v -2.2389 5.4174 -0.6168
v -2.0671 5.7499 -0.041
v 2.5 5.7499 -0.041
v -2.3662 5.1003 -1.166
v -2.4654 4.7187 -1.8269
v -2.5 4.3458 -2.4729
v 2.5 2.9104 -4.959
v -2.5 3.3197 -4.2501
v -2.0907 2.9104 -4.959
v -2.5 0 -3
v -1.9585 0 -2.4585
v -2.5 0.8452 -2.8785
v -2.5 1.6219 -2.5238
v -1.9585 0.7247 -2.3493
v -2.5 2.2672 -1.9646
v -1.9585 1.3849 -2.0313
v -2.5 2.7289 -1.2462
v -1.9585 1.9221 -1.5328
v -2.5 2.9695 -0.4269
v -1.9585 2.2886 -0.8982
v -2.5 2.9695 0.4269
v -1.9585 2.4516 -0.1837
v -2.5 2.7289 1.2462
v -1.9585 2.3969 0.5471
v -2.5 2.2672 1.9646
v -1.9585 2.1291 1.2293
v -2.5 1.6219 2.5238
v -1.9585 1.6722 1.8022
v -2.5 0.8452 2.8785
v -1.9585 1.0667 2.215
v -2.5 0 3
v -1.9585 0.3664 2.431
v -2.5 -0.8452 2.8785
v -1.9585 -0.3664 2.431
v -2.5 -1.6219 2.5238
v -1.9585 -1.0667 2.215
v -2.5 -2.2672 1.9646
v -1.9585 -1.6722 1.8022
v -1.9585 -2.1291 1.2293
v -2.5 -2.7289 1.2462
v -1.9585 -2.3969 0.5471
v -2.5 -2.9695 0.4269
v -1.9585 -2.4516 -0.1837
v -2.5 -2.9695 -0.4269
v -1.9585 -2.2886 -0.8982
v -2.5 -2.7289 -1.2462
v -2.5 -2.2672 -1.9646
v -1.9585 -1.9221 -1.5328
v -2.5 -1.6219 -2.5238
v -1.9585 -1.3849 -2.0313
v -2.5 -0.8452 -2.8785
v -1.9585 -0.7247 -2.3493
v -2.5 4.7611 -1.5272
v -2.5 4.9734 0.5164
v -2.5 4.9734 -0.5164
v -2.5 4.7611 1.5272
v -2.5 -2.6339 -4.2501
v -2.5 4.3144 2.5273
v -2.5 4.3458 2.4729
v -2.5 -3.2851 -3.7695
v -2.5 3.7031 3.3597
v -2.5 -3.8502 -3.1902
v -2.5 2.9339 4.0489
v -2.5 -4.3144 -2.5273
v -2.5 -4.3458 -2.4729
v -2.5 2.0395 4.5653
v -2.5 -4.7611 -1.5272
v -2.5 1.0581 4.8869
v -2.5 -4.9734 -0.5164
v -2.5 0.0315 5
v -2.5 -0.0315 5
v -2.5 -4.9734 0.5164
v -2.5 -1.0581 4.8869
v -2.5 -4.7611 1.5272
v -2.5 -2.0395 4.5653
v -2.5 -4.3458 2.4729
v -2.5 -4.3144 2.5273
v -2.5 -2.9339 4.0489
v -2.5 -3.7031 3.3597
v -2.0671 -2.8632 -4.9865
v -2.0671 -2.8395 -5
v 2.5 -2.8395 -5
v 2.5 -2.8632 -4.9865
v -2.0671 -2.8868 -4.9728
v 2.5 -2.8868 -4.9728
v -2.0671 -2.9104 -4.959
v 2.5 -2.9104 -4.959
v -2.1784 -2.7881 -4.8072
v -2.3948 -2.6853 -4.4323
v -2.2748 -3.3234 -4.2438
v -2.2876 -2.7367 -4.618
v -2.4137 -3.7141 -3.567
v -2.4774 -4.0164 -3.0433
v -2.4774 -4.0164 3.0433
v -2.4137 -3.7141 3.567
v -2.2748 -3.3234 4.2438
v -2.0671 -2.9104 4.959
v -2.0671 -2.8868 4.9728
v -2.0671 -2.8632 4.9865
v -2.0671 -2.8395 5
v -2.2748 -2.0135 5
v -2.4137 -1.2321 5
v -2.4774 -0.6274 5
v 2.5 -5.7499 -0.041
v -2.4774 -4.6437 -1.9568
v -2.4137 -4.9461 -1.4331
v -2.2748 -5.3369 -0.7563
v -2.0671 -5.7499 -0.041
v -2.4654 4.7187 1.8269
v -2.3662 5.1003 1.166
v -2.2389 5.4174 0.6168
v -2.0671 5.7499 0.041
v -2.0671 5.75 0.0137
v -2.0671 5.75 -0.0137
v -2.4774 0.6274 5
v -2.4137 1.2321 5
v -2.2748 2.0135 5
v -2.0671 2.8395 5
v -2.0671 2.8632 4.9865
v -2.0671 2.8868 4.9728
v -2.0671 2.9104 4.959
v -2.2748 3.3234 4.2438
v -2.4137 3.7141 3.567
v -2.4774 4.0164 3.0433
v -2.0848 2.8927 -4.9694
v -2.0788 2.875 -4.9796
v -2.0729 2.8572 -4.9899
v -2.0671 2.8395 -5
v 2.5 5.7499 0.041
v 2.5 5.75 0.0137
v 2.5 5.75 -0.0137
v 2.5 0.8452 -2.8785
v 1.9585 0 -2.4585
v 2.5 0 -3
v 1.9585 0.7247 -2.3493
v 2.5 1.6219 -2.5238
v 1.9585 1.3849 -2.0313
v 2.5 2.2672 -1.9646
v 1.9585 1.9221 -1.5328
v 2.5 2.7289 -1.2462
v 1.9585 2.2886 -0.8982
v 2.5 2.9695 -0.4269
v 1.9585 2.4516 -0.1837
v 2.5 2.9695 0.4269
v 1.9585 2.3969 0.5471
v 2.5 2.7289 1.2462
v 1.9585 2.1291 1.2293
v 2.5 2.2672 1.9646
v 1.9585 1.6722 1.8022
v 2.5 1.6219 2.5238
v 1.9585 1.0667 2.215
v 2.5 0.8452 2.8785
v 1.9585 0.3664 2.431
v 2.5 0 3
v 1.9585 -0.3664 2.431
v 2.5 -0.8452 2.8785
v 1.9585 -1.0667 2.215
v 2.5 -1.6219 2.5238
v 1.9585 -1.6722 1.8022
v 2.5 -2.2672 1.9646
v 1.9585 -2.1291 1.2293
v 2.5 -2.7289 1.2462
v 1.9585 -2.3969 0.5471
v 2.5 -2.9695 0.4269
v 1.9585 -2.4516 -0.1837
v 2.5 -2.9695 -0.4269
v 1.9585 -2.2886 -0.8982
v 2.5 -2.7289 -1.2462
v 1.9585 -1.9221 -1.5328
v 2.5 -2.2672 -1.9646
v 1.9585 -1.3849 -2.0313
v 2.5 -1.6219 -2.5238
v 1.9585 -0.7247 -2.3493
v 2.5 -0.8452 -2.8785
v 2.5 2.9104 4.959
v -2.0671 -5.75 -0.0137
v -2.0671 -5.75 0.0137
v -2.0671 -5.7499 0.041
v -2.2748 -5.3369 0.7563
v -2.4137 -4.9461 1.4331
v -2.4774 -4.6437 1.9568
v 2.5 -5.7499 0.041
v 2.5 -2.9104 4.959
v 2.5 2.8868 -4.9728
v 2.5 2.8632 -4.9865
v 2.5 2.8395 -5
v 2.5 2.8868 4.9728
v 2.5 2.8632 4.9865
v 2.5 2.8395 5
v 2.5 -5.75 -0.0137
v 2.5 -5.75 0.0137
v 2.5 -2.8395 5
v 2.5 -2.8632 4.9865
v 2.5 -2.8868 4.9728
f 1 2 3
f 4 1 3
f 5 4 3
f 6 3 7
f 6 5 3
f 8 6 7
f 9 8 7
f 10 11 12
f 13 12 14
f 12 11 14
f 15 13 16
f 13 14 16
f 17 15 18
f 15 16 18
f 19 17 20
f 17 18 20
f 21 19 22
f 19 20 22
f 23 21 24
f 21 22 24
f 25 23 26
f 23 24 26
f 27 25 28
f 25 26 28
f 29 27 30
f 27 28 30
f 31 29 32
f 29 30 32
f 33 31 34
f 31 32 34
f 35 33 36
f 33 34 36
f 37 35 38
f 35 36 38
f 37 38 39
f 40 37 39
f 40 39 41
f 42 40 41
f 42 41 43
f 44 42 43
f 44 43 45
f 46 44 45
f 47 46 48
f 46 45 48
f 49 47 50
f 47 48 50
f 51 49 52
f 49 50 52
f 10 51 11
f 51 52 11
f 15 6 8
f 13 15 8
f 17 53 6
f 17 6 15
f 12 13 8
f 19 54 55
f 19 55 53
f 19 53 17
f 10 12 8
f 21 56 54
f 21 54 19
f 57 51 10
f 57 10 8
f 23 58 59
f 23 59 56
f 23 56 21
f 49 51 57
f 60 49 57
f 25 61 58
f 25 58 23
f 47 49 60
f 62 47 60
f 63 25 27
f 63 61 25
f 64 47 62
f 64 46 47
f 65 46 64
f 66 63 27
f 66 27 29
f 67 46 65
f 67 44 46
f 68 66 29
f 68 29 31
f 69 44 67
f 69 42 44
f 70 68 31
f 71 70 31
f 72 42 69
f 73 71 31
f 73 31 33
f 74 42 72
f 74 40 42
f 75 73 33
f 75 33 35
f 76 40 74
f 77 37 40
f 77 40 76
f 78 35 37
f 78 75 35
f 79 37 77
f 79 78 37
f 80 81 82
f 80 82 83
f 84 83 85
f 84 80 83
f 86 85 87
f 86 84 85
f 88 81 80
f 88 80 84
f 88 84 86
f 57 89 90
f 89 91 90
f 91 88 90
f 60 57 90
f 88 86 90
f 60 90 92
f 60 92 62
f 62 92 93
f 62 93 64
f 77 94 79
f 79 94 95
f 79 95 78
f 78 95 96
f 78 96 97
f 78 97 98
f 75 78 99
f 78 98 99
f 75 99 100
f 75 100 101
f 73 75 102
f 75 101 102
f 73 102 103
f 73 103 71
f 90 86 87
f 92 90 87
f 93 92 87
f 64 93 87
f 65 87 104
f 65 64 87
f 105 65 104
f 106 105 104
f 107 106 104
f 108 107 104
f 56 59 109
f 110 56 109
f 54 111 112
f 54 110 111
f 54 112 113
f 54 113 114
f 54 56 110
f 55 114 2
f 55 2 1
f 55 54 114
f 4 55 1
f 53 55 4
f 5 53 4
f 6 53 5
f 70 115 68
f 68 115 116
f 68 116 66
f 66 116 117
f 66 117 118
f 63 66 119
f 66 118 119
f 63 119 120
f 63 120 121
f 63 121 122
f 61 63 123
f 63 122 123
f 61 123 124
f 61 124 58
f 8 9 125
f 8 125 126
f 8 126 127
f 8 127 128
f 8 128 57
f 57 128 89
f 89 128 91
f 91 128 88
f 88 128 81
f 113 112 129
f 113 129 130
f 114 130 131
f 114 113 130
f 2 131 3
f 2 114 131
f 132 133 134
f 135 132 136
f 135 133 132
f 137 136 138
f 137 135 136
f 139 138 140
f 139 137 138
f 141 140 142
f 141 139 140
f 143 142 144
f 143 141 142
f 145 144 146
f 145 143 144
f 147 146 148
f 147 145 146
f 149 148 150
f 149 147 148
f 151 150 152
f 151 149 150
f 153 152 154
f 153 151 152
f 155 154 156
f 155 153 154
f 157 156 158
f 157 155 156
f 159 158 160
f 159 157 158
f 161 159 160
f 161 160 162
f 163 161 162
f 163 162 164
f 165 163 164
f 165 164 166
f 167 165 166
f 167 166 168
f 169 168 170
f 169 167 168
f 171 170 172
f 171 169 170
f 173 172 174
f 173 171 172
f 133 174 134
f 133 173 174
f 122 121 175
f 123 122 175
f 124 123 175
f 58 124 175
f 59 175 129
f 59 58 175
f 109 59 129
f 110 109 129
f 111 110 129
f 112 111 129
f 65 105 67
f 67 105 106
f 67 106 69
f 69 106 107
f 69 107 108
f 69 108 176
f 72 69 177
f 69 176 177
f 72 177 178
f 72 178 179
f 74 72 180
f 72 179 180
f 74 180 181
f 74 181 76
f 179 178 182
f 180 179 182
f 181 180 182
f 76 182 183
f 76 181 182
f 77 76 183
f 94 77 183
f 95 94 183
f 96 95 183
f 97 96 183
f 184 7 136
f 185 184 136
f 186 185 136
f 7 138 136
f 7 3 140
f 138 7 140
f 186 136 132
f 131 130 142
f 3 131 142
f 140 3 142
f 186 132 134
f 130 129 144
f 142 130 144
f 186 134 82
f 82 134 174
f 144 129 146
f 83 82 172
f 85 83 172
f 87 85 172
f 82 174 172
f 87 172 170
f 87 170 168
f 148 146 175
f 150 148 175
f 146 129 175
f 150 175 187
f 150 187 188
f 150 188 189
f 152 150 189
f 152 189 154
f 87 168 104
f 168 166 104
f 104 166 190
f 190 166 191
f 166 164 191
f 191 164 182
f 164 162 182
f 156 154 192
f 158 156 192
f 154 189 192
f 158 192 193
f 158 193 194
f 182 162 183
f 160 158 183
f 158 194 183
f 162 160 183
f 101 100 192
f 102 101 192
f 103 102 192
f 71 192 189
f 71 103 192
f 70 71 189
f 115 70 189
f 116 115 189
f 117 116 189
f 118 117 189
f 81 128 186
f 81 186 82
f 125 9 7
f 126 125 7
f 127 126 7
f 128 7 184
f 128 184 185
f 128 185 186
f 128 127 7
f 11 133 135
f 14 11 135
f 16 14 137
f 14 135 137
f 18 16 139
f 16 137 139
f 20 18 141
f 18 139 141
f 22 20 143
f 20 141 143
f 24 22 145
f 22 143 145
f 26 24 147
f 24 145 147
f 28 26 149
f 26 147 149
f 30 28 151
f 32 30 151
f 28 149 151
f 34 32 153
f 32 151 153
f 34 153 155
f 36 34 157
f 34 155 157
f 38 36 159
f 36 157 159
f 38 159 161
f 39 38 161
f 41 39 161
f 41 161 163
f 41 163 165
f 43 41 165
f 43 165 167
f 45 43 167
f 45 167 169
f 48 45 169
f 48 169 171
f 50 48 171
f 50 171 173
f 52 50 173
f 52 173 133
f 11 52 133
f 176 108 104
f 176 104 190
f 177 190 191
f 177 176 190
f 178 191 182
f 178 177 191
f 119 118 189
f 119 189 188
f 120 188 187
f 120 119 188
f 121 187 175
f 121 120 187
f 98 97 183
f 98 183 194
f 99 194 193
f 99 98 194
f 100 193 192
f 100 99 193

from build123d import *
from OCP.BRepFilletAPI import BRepFilletAPI_MakeChamfer

# Parameters (mm, degrees)
BOSS_EXTRUDE1_DEPTH = 5
HOLE1_D             = 4.917
CHAMFER1_SIZE       = 0.75
CHAMFER1_SIZE_2     = 0.433012702
CHAMFER2_SIZE       = 0.5415


with BuildPart() as part:
    # Sketch1 → Boss-Extrude1 (new body)
    with BuildSketch(Plane(origin=(-2.5, 0, 0), x_dir=(0, -1, 0), z_dir=(-1, 0, 0))):
        with BuildLine():
            Line((5.749854105, 0.040960553), (2.910399932, 4.959039447))
            ThreePointArc((2.910399932, 4.959039447), (2.875, 4.979646072), (2.839454173, 5))
            Line((2.839454173, 5), (-2.839454173, 5))
            ThreePointArc((-2.839454173, 5), (-2.875, 4.979646072), (-2.910399932, 4.959039447))
            Line((-2.910399932, 4.959039447), (-5.749854105, 0.040960553))
            ThreePointArc((-5.749854105, 0.040960553), (-5.75, 0), (-5.749854105, -0.040960553))
            Line((-5.749854105, -0.040960553), (-2.910399932, -4.959039447))
            ThreePointArc((-2.910399932, -4.959039447), (-2.875, -4.979646072), (-2.839454173, -5))
            Line((-2.839454173, -5), (2.839454173, -5))
            ThreePointArc((2.839454173, -5), (2.875, -4.979646072), (2.910399932, -4.959039447))
            Line((2.910399932, -4.959039447), (5.749854105, -0.040960553))
            ThreePointArc((5.749854105, -0.040960553), (5.75, 0), (5.749854105, 0.040960553))
        make_face()
    extrude(amount=-BOSS_EXTRUDE1_DEPTH)

    # Hole1 (through all)
    with Locations(Plane.ZY.offset(2.5)):
        with Locations((0, 0)):
            Hole(HOLE1_D / 2)

    # Chamfer1
    chamfer1_edges_1 = [part.edges().sort_by_distance(p)[0] for p in [
        (-2.5, -5.75, 0),
    ]]
    chamfer1_side_1 = [part.faces().sort_by_distance(p)[0] for p in [
        (-2.5, -5.741339746, 0),
    ]]
    chamfer1_edges_2 = [part.edges().sort_by_distance(p)[0] for p in [
        (-2.5, 5.75, 0),
    ]]
    chamfer1_side_2 = [part.faces().sort_by_distance(p)[0] for p in [
        (-2.491339746, 5.75, 0),
    ]]
    chamfer1_edges_3 = [part.edges().sort_by_distance(p)[0] for p in [
        (-2.5, 0, -5),
    ]]
    chamfer1_side_3 = [part.faces().sort_by_distance(p)[0] for p in [
        (-2.5, 0, -4.991339746),
    ]]
    chamfer1_edges_4 = [part.edges().sort_by_distance(p)[0] for p in [
        (-2.5, -2.875, -4.979646072),
    ]]
    chamfer1_side_4 = [part.faces().sort_by_distance(p)[0] for p in [
        (-2.5, -2.870669873, -4.972146072),
    ]]
    chamfer1_edges_5 = [part.edges().sort_by_distance(p)[0] for p in [
        (-2.5, 2.875, 4.979646072),
    ]]
    chamfer1_side_5 = [part.faces().sort_by_distance(p)[0] for p in [
        (-2.5, 2.870669873, 4.972146072),
    ]]
    chamfer1_edges_6 = [part.edges().sort_by_distance(p)[0] for p in [
        (-2.5, -2.875, 4.979646072),
    ]]
    chamfer1_side_6 = [part.faces().sort_by_distance(p)[0] for p in [
        (-2.5, -2.870669873, 4.972146072),
    ]]
    chamfer1 = BRepFilletAPI_MakeChamfer(part.part.solid().wrapped)
    for e in chamfer1_edges_1:
        chamfer1.Add(CHAMFER1_SIZE - 0.0001, CHAMFER1_SIZE_2 - 0.0001, e.wrapped, chamfer1_side_1[0].wrapped)
    for e in chamfer1_edges_2:
        chamfer1.Add(CHAMFER1_SIZE_2 - 0.0001, CHAMFER1_SIZE - 0.0001, e.wrapped, chamfer1_side_2[0].wrapped)
    for e in chamfer1_edges_3:
        chamfer1.Add(CHAMFER1_SIZE - 0.0001, CHAMFER1_SIZE_2 - 0.0001, e.wrapped, chamfer1_side_3[0].wrapped)
    for e in chamfer1_edges_4:
        chamfer1.Add(CHAMFER1_SIZE - 0.0001, CHAMFER1_SIZE_2 - 0.0001, e.wrapped, chamfer1_side_4[0].wrapped)
    for e in chamfer1_edges_5:
        chamfer1.Add(CHAMFER1_SIZE - 0.0001, CHAMFER1_SIZE_2 - 0.0001, e.wrapped, chamfer1_side_5[0].wrapped)
    for e in chamfer1_edges_6:
        chamfer1.Add(CHAMFER1_SIZE - 0.0001, CHAMFER1_SIZE_2 - 0.0001, e.wrapped, chamfer1_side_6[0].wrapped)
    add(Compound.cast(chamfer1.Shape()), mode=Mode.REPLACE)  # a hair under: the kernel refuses the full size

    # Chamfer2
    chamfer2_edges = [part.edges().sort_by_distance(p)[0] for p in [
        (-2.5, 0, 2.4585),
        (2.5, 0, 2.4585),
    ]]
    chamfer(chamfer2_edges, length=CHAMFER2_SIZE)


solid = part.part
